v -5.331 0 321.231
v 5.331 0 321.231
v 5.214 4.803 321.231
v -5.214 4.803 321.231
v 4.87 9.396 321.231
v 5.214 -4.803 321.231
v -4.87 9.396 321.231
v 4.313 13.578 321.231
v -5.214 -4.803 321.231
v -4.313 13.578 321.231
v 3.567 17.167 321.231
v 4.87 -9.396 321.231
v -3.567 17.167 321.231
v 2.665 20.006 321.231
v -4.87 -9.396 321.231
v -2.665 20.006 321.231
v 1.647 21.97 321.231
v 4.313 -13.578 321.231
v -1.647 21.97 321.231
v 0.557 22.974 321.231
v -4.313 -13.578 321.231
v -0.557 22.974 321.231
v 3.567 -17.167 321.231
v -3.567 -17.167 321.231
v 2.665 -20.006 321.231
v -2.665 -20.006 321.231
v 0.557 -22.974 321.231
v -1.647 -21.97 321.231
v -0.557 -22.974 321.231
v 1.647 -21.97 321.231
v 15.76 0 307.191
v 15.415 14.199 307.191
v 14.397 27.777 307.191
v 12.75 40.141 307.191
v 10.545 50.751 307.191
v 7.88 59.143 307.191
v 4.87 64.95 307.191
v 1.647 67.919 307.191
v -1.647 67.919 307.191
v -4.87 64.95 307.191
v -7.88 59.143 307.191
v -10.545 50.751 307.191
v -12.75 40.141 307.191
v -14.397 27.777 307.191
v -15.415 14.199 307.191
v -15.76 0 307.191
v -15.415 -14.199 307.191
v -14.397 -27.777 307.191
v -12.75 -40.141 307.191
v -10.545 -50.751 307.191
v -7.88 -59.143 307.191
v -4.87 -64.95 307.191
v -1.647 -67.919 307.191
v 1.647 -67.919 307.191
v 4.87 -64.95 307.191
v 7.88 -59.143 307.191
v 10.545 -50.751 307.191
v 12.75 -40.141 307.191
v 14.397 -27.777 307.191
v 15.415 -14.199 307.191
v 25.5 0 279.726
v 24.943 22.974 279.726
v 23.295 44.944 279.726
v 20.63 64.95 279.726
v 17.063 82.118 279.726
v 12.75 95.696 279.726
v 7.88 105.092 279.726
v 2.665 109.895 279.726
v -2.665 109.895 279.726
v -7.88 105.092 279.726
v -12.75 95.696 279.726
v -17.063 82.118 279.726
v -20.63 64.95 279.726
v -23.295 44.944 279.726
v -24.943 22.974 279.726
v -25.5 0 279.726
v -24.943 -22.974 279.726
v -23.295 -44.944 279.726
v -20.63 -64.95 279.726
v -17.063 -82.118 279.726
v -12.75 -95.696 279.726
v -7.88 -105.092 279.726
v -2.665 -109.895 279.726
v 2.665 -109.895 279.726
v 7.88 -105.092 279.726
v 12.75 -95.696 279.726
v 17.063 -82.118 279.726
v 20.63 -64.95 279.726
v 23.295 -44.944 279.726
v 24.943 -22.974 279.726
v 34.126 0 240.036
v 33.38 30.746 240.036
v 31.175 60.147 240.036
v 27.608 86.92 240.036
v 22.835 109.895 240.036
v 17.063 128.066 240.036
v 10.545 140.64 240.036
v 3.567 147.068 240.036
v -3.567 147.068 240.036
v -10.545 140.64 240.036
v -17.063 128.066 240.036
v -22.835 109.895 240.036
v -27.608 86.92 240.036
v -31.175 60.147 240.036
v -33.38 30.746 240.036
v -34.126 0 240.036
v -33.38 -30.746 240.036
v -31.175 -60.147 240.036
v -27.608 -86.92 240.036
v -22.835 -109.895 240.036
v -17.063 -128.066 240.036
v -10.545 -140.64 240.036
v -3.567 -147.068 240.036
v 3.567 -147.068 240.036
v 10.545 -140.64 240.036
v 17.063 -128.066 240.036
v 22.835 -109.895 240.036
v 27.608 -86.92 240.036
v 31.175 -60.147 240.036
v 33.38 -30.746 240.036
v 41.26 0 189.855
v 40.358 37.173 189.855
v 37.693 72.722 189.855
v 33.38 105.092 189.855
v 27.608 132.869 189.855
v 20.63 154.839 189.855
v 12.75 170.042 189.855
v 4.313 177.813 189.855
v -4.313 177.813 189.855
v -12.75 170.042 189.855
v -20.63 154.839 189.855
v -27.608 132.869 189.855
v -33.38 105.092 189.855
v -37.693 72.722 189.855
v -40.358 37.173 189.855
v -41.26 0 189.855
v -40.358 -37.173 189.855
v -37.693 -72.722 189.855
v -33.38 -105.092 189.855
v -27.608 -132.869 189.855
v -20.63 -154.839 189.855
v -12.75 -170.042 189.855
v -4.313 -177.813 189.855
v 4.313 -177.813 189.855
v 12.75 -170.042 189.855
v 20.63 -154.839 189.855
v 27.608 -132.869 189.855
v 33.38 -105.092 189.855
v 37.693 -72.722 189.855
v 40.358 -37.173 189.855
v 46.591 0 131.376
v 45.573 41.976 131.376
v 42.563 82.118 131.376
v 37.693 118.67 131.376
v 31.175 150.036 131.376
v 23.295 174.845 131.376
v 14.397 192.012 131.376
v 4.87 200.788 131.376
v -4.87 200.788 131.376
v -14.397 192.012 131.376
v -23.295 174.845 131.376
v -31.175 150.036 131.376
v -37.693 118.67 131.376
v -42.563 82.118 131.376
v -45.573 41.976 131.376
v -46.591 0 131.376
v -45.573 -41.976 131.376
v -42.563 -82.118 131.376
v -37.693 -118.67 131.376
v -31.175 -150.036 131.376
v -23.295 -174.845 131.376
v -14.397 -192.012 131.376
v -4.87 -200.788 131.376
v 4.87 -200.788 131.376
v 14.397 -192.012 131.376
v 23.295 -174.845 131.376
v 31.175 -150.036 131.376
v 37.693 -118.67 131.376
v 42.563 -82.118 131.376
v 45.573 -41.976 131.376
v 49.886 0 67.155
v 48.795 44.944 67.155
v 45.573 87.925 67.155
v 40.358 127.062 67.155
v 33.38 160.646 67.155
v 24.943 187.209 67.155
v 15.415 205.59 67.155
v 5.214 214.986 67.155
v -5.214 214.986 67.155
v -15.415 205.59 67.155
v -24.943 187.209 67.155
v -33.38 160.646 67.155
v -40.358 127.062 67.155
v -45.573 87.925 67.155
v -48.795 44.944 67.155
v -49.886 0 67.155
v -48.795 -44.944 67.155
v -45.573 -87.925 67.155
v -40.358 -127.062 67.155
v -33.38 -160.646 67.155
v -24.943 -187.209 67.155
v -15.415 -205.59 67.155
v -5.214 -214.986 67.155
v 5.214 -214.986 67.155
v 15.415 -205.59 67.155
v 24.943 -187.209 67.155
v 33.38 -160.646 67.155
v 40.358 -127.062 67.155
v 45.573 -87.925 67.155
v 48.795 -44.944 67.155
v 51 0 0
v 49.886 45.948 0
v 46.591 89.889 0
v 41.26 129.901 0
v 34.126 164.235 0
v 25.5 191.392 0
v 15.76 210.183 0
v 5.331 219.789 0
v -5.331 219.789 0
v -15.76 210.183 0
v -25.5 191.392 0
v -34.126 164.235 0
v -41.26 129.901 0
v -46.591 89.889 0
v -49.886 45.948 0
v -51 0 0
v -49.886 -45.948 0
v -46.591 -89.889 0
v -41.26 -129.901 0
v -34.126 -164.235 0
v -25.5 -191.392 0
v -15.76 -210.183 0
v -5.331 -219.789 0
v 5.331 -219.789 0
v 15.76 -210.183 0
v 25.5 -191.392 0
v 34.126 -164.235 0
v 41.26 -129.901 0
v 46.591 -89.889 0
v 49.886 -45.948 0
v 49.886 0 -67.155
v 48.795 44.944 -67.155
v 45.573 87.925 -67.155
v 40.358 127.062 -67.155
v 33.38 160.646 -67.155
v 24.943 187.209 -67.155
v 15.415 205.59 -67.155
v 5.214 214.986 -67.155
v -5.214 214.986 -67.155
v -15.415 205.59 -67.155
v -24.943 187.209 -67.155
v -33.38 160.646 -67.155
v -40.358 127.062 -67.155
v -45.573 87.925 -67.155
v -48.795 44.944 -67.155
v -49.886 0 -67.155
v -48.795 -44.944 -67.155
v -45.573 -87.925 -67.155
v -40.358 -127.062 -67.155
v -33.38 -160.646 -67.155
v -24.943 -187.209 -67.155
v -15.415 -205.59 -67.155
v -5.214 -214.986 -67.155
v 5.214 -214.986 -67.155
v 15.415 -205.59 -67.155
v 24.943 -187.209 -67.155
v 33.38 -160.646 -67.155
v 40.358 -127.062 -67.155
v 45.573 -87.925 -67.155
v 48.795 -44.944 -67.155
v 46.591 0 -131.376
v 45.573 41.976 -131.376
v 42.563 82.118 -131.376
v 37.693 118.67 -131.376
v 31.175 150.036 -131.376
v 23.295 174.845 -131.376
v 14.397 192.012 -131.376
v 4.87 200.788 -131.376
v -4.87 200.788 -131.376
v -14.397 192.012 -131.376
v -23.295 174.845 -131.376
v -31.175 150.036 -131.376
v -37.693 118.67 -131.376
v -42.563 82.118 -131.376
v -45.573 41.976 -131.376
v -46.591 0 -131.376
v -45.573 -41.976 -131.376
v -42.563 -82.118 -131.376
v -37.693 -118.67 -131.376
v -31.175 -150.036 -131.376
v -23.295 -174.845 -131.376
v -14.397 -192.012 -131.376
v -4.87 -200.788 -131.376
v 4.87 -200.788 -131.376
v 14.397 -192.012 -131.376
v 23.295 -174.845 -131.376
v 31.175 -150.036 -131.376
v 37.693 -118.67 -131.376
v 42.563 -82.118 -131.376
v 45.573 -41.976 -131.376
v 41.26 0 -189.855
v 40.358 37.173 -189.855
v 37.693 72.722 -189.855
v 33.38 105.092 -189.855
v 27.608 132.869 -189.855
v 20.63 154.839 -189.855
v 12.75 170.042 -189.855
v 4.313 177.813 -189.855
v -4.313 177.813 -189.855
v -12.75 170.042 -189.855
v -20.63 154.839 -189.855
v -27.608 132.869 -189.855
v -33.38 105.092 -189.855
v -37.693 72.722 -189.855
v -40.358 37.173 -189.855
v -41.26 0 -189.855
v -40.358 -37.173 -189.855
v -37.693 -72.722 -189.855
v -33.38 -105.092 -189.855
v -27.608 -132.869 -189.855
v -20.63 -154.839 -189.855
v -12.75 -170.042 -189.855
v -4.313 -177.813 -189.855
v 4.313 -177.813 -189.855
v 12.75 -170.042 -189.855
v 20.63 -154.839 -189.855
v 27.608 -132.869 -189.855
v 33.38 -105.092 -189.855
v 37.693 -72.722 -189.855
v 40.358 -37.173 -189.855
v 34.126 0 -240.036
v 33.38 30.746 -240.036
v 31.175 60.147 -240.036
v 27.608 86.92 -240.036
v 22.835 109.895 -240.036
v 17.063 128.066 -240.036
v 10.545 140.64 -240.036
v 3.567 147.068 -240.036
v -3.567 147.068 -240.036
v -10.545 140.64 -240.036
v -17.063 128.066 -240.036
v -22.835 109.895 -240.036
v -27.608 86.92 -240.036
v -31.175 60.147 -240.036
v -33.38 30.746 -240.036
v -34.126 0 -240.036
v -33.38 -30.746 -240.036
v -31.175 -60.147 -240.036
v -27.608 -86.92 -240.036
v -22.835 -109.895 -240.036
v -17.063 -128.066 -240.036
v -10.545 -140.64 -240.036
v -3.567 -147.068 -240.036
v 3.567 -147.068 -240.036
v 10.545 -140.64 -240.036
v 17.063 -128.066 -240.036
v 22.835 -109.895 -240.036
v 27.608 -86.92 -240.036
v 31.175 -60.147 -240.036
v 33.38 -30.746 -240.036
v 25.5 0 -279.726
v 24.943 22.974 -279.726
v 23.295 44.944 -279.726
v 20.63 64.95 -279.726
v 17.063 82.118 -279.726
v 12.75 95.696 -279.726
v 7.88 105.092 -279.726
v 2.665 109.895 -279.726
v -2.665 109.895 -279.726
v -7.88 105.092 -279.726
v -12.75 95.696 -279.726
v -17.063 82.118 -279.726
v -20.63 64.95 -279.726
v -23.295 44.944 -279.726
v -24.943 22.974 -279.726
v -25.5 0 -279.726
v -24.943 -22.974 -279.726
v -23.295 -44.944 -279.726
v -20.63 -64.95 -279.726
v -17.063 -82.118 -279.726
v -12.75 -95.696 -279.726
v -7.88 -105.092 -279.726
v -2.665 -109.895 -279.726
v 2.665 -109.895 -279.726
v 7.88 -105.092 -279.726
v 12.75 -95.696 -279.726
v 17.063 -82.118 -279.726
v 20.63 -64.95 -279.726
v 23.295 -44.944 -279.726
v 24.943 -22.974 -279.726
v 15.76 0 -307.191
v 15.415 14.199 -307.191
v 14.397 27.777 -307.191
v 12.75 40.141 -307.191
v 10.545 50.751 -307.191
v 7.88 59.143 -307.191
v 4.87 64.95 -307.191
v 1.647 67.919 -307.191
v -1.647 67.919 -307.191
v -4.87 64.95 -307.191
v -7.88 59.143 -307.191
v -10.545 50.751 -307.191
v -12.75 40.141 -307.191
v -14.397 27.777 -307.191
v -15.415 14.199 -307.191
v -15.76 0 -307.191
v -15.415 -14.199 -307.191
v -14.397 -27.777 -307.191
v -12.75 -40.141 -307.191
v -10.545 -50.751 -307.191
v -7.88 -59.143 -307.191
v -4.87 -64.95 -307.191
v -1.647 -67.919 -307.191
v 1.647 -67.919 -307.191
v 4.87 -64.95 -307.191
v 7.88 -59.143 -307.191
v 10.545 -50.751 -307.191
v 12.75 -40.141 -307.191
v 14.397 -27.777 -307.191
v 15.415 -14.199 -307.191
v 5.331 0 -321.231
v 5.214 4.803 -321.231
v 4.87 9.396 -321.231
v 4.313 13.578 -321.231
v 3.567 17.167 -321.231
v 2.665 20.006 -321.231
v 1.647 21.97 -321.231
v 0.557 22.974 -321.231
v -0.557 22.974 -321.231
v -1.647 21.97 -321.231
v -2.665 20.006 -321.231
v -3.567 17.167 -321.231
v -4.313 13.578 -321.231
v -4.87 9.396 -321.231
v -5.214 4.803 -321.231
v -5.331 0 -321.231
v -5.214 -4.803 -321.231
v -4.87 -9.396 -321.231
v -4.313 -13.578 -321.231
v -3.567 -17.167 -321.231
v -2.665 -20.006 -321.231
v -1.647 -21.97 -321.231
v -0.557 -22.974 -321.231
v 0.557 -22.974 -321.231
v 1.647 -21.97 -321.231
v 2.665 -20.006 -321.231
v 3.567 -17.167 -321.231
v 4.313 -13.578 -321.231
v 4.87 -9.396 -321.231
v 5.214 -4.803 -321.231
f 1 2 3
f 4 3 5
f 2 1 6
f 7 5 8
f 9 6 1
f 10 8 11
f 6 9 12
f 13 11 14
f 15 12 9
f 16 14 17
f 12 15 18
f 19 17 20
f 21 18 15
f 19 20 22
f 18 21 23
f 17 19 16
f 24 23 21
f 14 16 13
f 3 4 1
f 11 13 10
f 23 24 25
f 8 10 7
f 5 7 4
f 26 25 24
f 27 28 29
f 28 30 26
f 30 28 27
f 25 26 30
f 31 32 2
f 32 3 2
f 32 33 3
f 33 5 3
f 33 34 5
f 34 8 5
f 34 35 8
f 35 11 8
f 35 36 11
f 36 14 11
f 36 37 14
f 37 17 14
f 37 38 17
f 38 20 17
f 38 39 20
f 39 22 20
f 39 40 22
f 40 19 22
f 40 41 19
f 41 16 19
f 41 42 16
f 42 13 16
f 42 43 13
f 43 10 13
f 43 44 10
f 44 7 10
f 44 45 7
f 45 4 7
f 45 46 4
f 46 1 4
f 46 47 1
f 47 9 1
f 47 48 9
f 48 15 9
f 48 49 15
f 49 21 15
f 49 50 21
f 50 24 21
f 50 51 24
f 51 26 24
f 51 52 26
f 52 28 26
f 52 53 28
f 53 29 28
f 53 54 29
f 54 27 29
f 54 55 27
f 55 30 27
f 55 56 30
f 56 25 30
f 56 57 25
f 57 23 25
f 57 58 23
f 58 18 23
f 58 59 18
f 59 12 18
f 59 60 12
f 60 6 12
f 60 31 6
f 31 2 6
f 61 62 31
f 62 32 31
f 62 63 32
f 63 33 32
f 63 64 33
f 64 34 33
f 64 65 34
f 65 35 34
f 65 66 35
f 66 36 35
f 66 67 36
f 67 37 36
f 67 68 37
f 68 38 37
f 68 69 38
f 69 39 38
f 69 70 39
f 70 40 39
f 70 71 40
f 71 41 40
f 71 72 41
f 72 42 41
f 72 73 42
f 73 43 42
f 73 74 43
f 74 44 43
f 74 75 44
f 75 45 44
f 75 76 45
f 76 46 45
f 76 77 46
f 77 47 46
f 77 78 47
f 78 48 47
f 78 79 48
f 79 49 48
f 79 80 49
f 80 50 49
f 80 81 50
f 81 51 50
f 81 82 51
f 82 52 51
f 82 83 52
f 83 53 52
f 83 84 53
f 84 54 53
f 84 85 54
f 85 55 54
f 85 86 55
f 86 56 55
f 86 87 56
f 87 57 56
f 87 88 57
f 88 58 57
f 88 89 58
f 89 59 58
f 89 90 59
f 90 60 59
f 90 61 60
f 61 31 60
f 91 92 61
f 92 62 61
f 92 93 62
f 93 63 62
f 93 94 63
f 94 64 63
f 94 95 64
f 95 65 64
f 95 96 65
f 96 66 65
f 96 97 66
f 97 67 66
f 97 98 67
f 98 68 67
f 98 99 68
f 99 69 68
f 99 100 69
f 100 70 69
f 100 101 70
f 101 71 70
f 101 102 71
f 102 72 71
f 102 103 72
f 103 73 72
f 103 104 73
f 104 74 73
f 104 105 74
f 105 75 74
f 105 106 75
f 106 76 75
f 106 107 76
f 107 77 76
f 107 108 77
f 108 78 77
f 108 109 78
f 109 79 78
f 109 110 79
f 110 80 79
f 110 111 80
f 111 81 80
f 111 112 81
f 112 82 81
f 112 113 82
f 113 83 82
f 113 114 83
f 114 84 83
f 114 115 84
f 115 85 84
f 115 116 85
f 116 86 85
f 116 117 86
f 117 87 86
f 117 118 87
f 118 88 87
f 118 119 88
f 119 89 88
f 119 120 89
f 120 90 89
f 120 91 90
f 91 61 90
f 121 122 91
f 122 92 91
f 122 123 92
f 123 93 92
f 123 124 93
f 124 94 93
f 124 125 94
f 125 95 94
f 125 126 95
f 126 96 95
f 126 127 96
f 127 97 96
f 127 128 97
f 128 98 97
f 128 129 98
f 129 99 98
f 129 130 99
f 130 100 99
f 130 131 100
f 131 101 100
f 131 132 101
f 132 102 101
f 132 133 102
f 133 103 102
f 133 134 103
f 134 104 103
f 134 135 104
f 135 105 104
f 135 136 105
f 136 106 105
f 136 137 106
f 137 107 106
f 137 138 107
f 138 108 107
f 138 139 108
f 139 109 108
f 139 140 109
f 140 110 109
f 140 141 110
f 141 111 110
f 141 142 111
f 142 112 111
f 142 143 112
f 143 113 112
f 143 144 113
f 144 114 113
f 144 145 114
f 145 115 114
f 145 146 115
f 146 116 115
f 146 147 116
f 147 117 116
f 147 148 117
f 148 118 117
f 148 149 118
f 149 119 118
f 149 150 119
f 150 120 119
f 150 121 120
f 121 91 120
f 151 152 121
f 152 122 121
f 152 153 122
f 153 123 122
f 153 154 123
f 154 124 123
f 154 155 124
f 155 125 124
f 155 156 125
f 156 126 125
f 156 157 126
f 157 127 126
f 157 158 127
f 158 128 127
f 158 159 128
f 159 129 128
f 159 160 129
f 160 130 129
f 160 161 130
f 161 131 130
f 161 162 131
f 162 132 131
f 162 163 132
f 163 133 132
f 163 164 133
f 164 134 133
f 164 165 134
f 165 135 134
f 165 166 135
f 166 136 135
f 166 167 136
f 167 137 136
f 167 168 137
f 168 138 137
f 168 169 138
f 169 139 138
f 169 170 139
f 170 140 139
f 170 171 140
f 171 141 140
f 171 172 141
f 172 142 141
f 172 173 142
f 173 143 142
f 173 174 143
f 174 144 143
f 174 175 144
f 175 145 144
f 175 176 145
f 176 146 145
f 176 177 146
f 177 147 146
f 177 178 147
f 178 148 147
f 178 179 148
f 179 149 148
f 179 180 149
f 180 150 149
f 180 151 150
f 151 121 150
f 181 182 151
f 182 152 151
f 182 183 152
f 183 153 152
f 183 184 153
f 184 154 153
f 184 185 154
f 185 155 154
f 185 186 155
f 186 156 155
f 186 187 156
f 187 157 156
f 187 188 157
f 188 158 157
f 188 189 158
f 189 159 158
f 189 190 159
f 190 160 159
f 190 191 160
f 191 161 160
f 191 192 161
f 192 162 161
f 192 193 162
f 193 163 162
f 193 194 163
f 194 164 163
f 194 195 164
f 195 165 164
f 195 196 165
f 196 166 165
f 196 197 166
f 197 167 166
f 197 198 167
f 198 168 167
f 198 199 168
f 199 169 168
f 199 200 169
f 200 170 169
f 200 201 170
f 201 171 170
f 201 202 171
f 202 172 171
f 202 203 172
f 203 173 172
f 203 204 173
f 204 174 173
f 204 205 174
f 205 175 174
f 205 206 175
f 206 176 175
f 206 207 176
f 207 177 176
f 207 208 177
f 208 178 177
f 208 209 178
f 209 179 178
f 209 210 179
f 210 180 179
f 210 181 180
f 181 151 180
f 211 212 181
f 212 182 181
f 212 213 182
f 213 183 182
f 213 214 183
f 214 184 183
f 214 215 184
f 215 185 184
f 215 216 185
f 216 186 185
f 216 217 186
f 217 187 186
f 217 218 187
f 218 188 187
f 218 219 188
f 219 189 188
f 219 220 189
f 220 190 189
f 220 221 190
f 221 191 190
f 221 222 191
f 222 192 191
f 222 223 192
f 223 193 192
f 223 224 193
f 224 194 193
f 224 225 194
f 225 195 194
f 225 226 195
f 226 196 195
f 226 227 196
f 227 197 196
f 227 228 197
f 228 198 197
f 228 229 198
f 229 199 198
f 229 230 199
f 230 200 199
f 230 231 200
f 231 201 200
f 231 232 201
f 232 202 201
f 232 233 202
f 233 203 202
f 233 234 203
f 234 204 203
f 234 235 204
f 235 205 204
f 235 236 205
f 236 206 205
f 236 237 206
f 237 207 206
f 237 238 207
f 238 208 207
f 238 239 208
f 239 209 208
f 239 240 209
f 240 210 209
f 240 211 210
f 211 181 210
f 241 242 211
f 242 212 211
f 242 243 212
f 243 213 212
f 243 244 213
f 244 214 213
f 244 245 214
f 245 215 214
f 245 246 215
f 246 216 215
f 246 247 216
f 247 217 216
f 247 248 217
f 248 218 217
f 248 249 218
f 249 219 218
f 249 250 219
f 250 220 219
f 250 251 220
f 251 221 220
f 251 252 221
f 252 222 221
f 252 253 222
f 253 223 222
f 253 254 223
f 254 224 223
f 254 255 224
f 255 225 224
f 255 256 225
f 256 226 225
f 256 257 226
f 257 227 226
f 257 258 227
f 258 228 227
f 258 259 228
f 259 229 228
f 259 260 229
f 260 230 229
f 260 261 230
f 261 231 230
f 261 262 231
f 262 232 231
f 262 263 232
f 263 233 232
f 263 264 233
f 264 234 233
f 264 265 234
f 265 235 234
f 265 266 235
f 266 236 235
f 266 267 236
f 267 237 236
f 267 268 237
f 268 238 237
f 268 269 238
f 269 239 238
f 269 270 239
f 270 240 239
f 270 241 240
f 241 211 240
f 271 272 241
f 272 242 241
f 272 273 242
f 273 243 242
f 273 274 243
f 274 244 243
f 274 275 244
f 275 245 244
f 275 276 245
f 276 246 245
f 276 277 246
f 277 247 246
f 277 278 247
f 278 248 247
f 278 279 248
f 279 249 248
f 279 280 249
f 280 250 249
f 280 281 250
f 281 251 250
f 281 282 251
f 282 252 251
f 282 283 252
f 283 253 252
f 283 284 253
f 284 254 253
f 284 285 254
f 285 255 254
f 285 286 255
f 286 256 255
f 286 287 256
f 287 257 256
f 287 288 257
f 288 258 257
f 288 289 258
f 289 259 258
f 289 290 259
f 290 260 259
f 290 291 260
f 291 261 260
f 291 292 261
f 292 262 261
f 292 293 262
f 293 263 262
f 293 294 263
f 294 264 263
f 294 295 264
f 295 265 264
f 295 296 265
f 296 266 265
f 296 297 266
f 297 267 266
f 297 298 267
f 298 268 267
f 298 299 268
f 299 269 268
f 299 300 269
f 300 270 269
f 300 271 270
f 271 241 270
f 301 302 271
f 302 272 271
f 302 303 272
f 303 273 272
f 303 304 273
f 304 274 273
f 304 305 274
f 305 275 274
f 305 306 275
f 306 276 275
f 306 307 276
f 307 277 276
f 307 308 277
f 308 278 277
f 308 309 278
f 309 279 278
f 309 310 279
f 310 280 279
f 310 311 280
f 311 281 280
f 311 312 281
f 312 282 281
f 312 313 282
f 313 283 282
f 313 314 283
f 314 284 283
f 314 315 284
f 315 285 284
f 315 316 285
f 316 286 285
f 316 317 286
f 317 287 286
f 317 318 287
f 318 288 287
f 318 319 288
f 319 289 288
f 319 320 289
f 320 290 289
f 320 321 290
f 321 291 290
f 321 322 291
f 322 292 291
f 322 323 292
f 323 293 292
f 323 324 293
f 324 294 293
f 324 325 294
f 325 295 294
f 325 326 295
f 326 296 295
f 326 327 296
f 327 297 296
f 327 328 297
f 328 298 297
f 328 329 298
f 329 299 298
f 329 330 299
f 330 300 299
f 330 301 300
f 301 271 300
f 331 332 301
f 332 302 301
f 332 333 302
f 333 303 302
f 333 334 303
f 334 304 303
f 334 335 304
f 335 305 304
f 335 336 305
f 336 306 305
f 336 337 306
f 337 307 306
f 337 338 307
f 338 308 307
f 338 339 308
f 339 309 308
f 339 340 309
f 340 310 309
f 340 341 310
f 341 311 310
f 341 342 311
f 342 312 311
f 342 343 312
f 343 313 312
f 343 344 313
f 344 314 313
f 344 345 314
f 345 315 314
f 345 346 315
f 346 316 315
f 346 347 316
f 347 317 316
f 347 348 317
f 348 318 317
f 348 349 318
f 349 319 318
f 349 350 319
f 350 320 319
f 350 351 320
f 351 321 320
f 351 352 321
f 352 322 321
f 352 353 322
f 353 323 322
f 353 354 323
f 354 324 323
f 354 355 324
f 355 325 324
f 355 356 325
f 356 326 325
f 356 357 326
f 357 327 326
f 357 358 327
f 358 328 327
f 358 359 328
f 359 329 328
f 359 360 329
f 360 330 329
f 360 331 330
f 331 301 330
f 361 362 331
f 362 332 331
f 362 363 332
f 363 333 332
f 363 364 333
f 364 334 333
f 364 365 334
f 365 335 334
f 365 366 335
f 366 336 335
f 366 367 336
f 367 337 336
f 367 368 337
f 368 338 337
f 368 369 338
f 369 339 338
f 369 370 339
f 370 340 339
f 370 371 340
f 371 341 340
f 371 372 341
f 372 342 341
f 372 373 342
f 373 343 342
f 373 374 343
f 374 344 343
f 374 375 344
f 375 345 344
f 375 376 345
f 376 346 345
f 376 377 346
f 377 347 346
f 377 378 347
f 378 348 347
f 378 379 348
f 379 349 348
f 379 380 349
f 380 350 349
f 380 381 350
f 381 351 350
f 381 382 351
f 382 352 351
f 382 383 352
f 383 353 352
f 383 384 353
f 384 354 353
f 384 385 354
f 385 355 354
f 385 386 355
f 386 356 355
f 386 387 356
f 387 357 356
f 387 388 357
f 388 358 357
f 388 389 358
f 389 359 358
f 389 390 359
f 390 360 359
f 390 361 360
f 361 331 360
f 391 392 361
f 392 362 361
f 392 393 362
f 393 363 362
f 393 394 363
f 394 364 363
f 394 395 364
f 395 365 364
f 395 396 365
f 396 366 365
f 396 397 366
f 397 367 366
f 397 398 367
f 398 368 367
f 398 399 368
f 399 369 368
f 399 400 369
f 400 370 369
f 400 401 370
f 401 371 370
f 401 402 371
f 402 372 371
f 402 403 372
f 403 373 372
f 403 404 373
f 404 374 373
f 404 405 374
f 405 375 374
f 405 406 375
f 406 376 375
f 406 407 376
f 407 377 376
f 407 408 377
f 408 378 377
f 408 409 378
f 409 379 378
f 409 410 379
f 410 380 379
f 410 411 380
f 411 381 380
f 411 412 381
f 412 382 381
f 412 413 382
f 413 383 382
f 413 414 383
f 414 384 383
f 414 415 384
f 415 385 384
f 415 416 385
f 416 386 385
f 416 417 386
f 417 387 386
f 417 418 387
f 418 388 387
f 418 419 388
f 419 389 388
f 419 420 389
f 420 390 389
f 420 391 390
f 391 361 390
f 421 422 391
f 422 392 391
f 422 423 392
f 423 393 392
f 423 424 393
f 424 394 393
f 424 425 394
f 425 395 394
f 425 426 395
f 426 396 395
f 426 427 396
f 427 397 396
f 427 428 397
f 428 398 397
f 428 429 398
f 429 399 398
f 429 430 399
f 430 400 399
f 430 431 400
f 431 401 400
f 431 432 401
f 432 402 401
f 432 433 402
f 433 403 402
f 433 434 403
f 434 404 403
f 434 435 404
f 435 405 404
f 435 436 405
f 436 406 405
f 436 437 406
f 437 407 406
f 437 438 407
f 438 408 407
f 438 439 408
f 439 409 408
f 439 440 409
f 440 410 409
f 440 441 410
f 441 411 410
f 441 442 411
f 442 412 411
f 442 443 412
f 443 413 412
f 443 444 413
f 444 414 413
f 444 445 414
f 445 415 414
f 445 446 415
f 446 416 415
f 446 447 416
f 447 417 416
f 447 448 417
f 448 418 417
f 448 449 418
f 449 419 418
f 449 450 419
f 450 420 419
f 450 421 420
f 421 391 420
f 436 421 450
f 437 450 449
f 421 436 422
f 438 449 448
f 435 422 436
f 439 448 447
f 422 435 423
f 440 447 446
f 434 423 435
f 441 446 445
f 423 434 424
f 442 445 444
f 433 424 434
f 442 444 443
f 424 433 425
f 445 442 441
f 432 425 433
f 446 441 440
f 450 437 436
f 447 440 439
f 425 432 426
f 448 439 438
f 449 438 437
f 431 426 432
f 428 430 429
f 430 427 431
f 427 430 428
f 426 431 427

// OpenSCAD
// Generated by SolidPython 1.0.1 on 2020-07-29 00:46:45


scale(v = [3, 13, 19]) {
	sphere(r = 17);
}
/***********************************************
*********      SolidPython code:      **********
************************************************
 
# import packages: SolidPython
from solid import *
from solid.utils import *
from itertools import chain, combinations, permutations


class Resize:

    def __init__(self, scad_file):
        self.scad_file = scad_file
        #self.scad_file = import_scad(scad_file)
        # cone/cylinder param:
        self.r1 = 0
        self.r2 = 0
        self.h = 0
        # rectangular prism param:
        self.w = 0
        self.l = 0
        # ellipse param:
        self.r = 0

    # import OpenScad code (file name corresponds to shape)


    # classify shape + parameters
    def assign(self, param1, param2, param3):
        if self.scad_file == 'cone.scad':
            self.r1 = param1
            self.r2 = param2
            self.h = param3
        elif self.scad_file == 'cylinder.scad':
            self.r1 = param1
            self.r2 = param2
            self.h = param3
        elif self.scad_file == 'rectangularPrism.scad':
            self.h = param1
            self.l = param2
            self.w = param3
        else:
            self.r = param1
            self.h = param2

    # resize parameters
    def iterate(self):
        x = range(3, 20, 2)
        i = 1
        if self.scad_file == 'cone.scad':
            tempList = list(permutations(x, 2))
            for temp in tempList:
                param1 = temp[0]
                param2 = temp[1]
                filepath = 'produced_scad_files/' + 'cone' + str(param1) + '_' + str(param2) + '_' + '.scad'
                scad_render_to_file(cylinder(h=param1, r1=param2, r2=0), filepath)

        elif self.scad_file == 'cylinder.scad':
            tempList = list(permutations(x, 3))
            for temp in tempList:
                param1 = temp[0]
                param2 = temp[1]
                filepath = 'produced_scad_files/' + 'cylinder' + str(param1) + '_' + str(param2) + '_' + '.scad'
                scad_render_to_file(cylinder(h=param1, r1=param2, r2=param2), filepath)

        elif self.scad_file == 'rectangularPrism.scad':
            tempList = list(permutations(x, 3))
            for temp in tempList:
                param1 = temp[0]
                param2 = temp[1]
                param3 = temp[2]
                filepath = 'produced_scad_files/' + 'rectangularPrism' + str(param1) + '_' + str(param2) + '_' + str(
                    param3) + '.scad'
                scad_render_to_file(cube(size=(param1, param2, param3)), filepath)

        elif self.scad_file == 'ellipse.scad':
            tempList = list(permutations(x, 4))
            for temp in tempList:
                param1 = temp[0]
                param2 = temp[1]
                param3 = temp[2]
                param4 = temp[3]
                filepath = 'produced_scad_files/' + 'ellipse' + str(param1) + '_' + str(param2) + '_' + str(param3) + '_' + str(param4) + '.scad'
                scad_render_to_file(scale([param1, param2, param3])(sphere(r=param4)), filepath)

    def render_to_scadfile(self):
        scad_render_to_file(scad, 'example.scad') 
 
************************************************/
